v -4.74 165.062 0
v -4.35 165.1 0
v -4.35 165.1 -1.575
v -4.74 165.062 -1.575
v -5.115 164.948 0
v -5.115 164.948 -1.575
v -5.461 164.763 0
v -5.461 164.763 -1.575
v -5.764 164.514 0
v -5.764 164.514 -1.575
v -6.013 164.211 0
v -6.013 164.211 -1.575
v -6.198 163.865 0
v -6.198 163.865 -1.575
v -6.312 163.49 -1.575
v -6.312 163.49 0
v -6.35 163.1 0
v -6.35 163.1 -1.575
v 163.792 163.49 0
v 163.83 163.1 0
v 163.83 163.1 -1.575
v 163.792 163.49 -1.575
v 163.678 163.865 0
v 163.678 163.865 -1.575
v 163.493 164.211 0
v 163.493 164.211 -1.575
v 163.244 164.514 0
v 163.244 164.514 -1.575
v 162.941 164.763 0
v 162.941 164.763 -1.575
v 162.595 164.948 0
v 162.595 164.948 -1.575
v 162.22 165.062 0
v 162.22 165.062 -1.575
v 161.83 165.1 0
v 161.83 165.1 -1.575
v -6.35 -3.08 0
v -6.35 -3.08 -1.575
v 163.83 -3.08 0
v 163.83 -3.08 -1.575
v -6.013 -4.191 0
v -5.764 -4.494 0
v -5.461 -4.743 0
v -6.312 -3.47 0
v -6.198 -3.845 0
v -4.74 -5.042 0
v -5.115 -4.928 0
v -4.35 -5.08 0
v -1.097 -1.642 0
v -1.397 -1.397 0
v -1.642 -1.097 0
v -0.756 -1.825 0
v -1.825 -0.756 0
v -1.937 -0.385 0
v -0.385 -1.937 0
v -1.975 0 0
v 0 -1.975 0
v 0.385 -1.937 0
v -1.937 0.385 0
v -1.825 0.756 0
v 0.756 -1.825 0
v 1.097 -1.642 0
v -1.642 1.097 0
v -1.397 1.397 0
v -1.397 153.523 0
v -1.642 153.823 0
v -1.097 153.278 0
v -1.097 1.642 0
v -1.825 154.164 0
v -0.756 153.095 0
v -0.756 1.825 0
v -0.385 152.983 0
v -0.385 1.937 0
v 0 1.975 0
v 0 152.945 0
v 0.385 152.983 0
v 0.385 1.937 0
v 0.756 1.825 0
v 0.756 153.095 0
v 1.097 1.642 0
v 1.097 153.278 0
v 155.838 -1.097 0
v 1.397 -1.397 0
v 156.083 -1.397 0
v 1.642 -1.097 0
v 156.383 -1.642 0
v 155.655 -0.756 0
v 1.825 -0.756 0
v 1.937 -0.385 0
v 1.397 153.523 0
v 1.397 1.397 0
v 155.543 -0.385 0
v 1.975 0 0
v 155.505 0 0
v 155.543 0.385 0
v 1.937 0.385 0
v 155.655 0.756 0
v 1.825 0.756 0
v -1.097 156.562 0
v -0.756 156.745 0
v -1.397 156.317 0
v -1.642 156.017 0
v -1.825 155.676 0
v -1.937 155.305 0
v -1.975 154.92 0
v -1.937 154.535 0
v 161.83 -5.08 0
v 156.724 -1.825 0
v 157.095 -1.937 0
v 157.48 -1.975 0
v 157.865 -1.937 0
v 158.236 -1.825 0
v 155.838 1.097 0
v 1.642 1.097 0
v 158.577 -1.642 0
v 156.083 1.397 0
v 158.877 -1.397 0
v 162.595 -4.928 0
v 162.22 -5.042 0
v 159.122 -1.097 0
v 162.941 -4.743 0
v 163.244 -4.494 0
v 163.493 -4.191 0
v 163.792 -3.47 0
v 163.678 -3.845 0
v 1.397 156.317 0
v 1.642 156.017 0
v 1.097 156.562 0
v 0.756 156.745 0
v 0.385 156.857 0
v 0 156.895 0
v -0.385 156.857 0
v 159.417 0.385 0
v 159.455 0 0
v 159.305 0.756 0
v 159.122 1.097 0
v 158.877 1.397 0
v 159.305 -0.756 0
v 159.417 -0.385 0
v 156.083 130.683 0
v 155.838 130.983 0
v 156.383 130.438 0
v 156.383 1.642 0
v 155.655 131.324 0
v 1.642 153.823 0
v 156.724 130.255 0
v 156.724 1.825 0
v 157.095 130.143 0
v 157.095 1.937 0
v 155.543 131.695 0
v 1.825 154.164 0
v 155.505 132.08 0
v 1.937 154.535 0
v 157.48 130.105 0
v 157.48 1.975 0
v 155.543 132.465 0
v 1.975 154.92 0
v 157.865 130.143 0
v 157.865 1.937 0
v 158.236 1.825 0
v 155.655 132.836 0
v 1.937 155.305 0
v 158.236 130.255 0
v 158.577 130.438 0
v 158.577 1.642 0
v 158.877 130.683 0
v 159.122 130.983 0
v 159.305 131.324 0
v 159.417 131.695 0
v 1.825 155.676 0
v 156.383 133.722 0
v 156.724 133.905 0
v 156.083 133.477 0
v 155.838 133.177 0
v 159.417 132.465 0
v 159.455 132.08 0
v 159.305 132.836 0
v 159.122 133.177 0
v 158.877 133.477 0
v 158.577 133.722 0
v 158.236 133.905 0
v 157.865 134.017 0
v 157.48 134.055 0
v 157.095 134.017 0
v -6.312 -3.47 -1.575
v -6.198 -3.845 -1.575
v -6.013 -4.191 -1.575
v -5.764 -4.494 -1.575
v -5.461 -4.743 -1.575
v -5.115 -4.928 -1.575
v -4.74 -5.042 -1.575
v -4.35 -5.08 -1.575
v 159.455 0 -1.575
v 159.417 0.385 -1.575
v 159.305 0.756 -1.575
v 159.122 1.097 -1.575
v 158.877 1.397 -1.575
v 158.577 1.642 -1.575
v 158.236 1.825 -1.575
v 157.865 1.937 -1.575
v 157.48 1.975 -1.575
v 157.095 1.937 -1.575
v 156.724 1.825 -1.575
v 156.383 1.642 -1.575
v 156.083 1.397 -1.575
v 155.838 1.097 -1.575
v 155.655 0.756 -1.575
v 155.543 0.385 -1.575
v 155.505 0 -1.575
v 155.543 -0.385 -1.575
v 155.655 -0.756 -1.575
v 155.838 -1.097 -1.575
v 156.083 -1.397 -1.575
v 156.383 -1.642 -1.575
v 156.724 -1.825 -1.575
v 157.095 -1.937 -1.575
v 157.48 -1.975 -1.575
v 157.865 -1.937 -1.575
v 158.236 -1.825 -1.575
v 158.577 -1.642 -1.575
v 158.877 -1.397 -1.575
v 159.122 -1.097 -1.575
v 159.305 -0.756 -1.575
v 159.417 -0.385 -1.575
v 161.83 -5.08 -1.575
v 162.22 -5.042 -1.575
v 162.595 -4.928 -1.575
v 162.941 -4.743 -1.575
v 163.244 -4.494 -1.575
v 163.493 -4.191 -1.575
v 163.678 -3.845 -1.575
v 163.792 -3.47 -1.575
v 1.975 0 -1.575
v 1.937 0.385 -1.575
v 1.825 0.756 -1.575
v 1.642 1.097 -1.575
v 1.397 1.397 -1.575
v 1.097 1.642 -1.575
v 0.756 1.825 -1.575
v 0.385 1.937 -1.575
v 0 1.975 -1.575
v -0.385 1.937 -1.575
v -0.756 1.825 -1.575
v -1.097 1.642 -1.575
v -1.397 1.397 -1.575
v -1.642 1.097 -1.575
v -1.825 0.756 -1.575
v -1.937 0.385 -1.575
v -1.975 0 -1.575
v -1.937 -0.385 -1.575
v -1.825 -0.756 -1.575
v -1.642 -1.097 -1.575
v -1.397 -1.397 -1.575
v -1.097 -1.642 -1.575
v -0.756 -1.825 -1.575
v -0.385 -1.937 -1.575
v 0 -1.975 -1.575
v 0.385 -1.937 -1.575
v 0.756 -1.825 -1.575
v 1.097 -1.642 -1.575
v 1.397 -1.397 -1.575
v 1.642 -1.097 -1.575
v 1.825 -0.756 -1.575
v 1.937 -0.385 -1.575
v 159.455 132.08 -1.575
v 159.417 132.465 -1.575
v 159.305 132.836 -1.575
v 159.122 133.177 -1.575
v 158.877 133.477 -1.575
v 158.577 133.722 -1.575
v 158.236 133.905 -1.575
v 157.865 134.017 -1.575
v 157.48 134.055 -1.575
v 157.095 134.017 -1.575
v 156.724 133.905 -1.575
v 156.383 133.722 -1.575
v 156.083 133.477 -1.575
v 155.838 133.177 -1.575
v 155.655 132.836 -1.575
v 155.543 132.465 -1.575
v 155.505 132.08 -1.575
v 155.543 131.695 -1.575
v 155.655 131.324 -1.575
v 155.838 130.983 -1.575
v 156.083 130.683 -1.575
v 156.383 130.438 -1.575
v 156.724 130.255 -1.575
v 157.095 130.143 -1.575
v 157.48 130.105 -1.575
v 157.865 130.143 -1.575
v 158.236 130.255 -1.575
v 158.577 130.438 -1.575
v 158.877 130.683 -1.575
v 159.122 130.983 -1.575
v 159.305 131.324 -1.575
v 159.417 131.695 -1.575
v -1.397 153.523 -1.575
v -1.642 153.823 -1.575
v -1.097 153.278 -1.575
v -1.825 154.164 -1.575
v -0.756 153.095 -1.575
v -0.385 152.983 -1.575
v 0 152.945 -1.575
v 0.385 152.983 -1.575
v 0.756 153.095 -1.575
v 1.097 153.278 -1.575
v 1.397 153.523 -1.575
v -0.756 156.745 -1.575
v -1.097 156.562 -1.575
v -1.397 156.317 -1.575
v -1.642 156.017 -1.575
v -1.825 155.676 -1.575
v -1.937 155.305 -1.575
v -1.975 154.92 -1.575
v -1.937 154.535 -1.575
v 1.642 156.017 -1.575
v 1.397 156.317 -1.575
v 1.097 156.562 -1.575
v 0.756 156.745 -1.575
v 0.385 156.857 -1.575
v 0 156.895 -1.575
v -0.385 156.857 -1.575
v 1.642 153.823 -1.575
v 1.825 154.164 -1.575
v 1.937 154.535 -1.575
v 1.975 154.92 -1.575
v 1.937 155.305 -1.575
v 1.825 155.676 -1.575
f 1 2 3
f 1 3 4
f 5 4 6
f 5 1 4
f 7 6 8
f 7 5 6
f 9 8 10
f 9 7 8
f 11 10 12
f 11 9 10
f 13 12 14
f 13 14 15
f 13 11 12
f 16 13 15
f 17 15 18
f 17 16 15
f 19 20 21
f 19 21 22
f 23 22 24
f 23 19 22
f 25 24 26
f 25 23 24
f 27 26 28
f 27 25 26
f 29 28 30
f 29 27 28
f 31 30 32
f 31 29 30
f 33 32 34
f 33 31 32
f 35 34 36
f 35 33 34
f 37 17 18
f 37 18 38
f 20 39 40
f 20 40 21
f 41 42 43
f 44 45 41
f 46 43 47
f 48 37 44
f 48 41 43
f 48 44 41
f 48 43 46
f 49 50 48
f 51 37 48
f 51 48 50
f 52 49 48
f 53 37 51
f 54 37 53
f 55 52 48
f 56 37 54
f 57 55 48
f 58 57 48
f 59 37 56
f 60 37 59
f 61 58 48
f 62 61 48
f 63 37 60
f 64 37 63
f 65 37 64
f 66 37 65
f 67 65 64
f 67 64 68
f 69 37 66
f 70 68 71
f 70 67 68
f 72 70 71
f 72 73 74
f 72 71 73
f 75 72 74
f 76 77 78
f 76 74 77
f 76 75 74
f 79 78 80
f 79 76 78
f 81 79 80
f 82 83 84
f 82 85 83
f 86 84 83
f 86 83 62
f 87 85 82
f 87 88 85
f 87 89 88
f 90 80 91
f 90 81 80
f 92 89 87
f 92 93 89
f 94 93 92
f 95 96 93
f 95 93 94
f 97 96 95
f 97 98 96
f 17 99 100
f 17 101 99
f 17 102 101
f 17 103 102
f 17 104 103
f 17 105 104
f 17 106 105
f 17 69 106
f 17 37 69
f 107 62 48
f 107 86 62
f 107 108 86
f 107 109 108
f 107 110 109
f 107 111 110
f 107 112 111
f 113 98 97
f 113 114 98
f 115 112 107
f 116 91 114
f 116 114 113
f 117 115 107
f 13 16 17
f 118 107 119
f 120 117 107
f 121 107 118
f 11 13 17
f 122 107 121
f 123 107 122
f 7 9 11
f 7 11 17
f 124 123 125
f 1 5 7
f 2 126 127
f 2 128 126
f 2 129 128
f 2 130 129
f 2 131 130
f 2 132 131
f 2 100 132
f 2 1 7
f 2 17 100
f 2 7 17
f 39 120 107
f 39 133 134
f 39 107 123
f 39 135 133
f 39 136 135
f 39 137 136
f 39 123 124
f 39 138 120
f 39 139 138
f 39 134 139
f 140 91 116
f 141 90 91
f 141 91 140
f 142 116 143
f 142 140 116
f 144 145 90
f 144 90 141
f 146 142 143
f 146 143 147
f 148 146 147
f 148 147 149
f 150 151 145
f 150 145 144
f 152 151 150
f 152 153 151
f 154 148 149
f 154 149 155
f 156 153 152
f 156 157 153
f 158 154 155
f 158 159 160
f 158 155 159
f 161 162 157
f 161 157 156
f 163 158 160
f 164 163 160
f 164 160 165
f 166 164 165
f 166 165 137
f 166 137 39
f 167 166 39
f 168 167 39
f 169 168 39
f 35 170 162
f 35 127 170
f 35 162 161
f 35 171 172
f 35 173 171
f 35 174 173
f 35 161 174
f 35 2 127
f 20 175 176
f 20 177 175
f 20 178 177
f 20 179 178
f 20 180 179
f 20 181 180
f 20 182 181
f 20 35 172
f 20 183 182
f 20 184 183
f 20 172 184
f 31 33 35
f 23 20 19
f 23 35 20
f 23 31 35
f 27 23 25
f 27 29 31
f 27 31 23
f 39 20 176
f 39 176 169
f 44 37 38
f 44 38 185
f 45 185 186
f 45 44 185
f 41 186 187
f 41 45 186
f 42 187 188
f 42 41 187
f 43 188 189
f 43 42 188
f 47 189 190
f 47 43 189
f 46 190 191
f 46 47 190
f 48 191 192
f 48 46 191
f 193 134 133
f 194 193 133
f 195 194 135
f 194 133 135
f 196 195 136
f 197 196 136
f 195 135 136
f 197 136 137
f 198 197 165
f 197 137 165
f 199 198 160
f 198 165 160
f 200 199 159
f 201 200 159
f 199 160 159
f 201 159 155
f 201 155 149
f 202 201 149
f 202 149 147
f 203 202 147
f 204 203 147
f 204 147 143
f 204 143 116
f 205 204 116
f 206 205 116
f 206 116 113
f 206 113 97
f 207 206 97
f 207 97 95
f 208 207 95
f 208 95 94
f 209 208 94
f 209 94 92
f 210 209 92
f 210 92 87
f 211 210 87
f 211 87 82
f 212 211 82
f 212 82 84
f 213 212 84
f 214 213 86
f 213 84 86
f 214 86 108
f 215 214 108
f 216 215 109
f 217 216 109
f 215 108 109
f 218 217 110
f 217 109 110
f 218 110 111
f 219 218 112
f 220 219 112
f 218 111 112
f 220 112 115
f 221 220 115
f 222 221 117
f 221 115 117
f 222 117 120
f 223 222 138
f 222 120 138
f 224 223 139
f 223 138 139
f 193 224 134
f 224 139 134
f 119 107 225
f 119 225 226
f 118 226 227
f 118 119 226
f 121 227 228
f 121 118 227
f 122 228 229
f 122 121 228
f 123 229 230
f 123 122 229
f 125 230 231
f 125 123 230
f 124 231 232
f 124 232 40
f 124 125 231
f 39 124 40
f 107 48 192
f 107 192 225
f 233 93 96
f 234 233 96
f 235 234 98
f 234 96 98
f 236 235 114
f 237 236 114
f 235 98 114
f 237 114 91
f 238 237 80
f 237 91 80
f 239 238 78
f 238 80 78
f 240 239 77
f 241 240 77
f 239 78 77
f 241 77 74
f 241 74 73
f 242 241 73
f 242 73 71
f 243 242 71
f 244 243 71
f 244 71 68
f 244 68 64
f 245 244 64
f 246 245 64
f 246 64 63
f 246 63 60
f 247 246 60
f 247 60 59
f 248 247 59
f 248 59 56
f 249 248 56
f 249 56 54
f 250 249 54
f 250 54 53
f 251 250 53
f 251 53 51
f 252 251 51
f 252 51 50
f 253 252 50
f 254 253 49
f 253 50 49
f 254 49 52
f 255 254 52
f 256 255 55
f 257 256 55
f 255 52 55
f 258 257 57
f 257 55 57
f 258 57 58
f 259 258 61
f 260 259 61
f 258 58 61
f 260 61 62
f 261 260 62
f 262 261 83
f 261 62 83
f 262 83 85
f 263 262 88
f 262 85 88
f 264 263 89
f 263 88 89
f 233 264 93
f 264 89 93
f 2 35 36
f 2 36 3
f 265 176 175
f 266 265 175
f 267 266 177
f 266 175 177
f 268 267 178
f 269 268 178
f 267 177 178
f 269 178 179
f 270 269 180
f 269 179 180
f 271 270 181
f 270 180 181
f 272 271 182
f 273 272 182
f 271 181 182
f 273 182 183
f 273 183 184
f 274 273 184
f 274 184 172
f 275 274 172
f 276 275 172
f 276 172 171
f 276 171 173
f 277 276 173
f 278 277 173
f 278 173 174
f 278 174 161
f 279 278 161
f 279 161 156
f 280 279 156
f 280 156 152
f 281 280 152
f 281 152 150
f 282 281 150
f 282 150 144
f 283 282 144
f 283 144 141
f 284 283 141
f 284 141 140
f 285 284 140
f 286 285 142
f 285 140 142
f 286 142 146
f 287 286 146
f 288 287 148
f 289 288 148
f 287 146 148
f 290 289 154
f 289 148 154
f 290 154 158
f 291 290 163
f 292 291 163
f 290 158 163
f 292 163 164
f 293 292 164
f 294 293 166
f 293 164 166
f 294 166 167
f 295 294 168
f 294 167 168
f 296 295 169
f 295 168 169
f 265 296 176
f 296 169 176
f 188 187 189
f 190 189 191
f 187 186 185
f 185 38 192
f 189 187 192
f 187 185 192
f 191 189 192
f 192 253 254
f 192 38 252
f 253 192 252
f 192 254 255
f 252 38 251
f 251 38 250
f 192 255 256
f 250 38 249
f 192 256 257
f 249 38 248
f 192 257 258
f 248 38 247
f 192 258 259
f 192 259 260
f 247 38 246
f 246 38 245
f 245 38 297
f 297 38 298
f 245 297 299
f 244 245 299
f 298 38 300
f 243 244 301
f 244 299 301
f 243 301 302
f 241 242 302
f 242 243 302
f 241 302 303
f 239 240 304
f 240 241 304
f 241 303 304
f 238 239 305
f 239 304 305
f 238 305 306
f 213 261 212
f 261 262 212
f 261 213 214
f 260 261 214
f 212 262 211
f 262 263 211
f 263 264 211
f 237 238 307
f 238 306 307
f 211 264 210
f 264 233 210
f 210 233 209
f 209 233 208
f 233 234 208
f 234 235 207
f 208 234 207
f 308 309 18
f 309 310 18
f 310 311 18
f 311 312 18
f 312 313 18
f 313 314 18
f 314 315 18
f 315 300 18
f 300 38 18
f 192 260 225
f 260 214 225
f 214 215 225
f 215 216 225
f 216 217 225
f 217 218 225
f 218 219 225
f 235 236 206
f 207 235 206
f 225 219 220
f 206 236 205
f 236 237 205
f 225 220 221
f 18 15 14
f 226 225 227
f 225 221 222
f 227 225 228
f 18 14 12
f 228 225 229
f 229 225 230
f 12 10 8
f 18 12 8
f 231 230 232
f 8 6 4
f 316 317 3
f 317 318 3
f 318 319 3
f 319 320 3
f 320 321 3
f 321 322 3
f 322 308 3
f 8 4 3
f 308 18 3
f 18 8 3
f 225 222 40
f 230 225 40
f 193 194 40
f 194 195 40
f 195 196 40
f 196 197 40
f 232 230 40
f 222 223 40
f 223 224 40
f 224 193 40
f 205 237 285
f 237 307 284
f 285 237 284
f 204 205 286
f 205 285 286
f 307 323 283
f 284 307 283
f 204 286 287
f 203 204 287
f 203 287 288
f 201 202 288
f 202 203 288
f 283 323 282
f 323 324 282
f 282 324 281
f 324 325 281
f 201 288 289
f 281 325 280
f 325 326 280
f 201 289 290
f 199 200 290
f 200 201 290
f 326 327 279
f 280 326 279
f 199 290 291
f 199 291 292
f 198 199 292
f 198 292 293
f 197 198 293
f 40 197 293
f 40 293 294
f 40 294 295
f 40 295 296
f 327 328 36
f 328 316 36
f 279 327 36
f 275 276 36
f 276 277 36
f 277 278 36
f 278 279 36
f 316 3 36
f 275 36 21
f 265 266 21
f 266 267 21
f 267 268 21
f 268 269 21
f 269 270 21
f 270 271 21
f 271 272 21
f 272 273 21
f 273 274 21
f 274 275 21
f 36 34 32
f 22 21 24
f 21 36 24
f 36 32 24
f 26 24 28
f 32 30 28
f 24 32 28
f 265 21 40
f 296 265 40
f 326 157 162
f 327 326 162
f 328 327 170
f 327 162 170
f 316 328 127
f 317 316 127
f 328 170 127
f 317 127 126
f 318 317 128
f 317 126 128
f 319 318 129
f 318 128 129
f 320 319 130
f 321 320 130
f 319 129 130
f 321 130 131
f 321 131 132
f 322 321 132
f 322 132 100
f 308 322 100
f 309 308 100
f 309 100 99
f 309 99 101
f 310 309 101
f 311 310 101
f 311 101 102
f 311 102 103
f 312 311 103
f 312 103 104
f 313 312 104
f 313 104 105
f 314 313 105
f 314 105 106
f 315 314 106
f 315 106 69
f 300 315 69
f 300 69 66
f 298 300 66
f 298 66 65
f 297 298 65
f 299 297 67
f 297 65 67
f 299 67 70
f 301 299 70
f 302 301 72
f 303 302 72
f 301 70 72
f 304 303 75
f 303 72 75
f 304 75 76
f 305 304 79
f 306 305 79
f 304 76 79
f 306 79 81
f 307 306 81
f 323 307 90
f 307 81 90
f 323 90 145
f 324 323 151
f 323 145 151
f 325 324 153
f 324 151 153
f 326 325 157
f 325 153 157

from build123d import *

# Parameters (mm, degrees)
SALIENTE_EXTRUIR1_DEPTH = 1.575
CROQUIS2_R              = 1.975
CORTAR_EXTRUIR1_DEPTH   = 10


with BuildPart() as part:
    # Croquis1 → Saliente-Extruir1 (new body)
    with BuildSketch(Plane.XY):
        with BuildLine():
            Line((161.83, 165.1), (-4.35, 165.1))
            ThreePointArc((-4.35, 165.1), (-5.764213562, 164.514213562), (-6.35, 163.1))
            Line((-6.35, 163.1), (-6.35, -3.08))
            ThreePointArc((-6.35, -3.08), (-5.764213562, -4.494213562), (-4.35, -5.08))
            Line((-4.35, -5.08), (161.83, -5.08))
            ThreePointArc((161.83, -5.08), (163.244213562, -4.494213562), (163.83, -3.08))
            Line((163.83, -3.08), (163.83, 163.1))
            ThreePointArc((163.83, 163.1), (163.244213562, 164.514213562), (161.83, 165.1))
        make_face()
    extrude(amount=-SALIENTE_EXTRUIR1_DEPTH)

    # Croquis2 → Cortar-Extruir1 (cut)
    with BuildSketch(Plane.XY):
        Circle(CROQUIS2_R)
        with Locations((157.48, 0)):
            Circle(CROQUIS2_R)
        with Locations((157.48, 132.08)):
            Circle(CROQUIS2_R)
        with Locations((0, 154.919999989)):
            Circle(CROQUIS2_R)
    extrude(amount=-CORTAR_EXTRUIR1_DEPTH, mode=Mode.SUBTRACT)


solid = part.part
